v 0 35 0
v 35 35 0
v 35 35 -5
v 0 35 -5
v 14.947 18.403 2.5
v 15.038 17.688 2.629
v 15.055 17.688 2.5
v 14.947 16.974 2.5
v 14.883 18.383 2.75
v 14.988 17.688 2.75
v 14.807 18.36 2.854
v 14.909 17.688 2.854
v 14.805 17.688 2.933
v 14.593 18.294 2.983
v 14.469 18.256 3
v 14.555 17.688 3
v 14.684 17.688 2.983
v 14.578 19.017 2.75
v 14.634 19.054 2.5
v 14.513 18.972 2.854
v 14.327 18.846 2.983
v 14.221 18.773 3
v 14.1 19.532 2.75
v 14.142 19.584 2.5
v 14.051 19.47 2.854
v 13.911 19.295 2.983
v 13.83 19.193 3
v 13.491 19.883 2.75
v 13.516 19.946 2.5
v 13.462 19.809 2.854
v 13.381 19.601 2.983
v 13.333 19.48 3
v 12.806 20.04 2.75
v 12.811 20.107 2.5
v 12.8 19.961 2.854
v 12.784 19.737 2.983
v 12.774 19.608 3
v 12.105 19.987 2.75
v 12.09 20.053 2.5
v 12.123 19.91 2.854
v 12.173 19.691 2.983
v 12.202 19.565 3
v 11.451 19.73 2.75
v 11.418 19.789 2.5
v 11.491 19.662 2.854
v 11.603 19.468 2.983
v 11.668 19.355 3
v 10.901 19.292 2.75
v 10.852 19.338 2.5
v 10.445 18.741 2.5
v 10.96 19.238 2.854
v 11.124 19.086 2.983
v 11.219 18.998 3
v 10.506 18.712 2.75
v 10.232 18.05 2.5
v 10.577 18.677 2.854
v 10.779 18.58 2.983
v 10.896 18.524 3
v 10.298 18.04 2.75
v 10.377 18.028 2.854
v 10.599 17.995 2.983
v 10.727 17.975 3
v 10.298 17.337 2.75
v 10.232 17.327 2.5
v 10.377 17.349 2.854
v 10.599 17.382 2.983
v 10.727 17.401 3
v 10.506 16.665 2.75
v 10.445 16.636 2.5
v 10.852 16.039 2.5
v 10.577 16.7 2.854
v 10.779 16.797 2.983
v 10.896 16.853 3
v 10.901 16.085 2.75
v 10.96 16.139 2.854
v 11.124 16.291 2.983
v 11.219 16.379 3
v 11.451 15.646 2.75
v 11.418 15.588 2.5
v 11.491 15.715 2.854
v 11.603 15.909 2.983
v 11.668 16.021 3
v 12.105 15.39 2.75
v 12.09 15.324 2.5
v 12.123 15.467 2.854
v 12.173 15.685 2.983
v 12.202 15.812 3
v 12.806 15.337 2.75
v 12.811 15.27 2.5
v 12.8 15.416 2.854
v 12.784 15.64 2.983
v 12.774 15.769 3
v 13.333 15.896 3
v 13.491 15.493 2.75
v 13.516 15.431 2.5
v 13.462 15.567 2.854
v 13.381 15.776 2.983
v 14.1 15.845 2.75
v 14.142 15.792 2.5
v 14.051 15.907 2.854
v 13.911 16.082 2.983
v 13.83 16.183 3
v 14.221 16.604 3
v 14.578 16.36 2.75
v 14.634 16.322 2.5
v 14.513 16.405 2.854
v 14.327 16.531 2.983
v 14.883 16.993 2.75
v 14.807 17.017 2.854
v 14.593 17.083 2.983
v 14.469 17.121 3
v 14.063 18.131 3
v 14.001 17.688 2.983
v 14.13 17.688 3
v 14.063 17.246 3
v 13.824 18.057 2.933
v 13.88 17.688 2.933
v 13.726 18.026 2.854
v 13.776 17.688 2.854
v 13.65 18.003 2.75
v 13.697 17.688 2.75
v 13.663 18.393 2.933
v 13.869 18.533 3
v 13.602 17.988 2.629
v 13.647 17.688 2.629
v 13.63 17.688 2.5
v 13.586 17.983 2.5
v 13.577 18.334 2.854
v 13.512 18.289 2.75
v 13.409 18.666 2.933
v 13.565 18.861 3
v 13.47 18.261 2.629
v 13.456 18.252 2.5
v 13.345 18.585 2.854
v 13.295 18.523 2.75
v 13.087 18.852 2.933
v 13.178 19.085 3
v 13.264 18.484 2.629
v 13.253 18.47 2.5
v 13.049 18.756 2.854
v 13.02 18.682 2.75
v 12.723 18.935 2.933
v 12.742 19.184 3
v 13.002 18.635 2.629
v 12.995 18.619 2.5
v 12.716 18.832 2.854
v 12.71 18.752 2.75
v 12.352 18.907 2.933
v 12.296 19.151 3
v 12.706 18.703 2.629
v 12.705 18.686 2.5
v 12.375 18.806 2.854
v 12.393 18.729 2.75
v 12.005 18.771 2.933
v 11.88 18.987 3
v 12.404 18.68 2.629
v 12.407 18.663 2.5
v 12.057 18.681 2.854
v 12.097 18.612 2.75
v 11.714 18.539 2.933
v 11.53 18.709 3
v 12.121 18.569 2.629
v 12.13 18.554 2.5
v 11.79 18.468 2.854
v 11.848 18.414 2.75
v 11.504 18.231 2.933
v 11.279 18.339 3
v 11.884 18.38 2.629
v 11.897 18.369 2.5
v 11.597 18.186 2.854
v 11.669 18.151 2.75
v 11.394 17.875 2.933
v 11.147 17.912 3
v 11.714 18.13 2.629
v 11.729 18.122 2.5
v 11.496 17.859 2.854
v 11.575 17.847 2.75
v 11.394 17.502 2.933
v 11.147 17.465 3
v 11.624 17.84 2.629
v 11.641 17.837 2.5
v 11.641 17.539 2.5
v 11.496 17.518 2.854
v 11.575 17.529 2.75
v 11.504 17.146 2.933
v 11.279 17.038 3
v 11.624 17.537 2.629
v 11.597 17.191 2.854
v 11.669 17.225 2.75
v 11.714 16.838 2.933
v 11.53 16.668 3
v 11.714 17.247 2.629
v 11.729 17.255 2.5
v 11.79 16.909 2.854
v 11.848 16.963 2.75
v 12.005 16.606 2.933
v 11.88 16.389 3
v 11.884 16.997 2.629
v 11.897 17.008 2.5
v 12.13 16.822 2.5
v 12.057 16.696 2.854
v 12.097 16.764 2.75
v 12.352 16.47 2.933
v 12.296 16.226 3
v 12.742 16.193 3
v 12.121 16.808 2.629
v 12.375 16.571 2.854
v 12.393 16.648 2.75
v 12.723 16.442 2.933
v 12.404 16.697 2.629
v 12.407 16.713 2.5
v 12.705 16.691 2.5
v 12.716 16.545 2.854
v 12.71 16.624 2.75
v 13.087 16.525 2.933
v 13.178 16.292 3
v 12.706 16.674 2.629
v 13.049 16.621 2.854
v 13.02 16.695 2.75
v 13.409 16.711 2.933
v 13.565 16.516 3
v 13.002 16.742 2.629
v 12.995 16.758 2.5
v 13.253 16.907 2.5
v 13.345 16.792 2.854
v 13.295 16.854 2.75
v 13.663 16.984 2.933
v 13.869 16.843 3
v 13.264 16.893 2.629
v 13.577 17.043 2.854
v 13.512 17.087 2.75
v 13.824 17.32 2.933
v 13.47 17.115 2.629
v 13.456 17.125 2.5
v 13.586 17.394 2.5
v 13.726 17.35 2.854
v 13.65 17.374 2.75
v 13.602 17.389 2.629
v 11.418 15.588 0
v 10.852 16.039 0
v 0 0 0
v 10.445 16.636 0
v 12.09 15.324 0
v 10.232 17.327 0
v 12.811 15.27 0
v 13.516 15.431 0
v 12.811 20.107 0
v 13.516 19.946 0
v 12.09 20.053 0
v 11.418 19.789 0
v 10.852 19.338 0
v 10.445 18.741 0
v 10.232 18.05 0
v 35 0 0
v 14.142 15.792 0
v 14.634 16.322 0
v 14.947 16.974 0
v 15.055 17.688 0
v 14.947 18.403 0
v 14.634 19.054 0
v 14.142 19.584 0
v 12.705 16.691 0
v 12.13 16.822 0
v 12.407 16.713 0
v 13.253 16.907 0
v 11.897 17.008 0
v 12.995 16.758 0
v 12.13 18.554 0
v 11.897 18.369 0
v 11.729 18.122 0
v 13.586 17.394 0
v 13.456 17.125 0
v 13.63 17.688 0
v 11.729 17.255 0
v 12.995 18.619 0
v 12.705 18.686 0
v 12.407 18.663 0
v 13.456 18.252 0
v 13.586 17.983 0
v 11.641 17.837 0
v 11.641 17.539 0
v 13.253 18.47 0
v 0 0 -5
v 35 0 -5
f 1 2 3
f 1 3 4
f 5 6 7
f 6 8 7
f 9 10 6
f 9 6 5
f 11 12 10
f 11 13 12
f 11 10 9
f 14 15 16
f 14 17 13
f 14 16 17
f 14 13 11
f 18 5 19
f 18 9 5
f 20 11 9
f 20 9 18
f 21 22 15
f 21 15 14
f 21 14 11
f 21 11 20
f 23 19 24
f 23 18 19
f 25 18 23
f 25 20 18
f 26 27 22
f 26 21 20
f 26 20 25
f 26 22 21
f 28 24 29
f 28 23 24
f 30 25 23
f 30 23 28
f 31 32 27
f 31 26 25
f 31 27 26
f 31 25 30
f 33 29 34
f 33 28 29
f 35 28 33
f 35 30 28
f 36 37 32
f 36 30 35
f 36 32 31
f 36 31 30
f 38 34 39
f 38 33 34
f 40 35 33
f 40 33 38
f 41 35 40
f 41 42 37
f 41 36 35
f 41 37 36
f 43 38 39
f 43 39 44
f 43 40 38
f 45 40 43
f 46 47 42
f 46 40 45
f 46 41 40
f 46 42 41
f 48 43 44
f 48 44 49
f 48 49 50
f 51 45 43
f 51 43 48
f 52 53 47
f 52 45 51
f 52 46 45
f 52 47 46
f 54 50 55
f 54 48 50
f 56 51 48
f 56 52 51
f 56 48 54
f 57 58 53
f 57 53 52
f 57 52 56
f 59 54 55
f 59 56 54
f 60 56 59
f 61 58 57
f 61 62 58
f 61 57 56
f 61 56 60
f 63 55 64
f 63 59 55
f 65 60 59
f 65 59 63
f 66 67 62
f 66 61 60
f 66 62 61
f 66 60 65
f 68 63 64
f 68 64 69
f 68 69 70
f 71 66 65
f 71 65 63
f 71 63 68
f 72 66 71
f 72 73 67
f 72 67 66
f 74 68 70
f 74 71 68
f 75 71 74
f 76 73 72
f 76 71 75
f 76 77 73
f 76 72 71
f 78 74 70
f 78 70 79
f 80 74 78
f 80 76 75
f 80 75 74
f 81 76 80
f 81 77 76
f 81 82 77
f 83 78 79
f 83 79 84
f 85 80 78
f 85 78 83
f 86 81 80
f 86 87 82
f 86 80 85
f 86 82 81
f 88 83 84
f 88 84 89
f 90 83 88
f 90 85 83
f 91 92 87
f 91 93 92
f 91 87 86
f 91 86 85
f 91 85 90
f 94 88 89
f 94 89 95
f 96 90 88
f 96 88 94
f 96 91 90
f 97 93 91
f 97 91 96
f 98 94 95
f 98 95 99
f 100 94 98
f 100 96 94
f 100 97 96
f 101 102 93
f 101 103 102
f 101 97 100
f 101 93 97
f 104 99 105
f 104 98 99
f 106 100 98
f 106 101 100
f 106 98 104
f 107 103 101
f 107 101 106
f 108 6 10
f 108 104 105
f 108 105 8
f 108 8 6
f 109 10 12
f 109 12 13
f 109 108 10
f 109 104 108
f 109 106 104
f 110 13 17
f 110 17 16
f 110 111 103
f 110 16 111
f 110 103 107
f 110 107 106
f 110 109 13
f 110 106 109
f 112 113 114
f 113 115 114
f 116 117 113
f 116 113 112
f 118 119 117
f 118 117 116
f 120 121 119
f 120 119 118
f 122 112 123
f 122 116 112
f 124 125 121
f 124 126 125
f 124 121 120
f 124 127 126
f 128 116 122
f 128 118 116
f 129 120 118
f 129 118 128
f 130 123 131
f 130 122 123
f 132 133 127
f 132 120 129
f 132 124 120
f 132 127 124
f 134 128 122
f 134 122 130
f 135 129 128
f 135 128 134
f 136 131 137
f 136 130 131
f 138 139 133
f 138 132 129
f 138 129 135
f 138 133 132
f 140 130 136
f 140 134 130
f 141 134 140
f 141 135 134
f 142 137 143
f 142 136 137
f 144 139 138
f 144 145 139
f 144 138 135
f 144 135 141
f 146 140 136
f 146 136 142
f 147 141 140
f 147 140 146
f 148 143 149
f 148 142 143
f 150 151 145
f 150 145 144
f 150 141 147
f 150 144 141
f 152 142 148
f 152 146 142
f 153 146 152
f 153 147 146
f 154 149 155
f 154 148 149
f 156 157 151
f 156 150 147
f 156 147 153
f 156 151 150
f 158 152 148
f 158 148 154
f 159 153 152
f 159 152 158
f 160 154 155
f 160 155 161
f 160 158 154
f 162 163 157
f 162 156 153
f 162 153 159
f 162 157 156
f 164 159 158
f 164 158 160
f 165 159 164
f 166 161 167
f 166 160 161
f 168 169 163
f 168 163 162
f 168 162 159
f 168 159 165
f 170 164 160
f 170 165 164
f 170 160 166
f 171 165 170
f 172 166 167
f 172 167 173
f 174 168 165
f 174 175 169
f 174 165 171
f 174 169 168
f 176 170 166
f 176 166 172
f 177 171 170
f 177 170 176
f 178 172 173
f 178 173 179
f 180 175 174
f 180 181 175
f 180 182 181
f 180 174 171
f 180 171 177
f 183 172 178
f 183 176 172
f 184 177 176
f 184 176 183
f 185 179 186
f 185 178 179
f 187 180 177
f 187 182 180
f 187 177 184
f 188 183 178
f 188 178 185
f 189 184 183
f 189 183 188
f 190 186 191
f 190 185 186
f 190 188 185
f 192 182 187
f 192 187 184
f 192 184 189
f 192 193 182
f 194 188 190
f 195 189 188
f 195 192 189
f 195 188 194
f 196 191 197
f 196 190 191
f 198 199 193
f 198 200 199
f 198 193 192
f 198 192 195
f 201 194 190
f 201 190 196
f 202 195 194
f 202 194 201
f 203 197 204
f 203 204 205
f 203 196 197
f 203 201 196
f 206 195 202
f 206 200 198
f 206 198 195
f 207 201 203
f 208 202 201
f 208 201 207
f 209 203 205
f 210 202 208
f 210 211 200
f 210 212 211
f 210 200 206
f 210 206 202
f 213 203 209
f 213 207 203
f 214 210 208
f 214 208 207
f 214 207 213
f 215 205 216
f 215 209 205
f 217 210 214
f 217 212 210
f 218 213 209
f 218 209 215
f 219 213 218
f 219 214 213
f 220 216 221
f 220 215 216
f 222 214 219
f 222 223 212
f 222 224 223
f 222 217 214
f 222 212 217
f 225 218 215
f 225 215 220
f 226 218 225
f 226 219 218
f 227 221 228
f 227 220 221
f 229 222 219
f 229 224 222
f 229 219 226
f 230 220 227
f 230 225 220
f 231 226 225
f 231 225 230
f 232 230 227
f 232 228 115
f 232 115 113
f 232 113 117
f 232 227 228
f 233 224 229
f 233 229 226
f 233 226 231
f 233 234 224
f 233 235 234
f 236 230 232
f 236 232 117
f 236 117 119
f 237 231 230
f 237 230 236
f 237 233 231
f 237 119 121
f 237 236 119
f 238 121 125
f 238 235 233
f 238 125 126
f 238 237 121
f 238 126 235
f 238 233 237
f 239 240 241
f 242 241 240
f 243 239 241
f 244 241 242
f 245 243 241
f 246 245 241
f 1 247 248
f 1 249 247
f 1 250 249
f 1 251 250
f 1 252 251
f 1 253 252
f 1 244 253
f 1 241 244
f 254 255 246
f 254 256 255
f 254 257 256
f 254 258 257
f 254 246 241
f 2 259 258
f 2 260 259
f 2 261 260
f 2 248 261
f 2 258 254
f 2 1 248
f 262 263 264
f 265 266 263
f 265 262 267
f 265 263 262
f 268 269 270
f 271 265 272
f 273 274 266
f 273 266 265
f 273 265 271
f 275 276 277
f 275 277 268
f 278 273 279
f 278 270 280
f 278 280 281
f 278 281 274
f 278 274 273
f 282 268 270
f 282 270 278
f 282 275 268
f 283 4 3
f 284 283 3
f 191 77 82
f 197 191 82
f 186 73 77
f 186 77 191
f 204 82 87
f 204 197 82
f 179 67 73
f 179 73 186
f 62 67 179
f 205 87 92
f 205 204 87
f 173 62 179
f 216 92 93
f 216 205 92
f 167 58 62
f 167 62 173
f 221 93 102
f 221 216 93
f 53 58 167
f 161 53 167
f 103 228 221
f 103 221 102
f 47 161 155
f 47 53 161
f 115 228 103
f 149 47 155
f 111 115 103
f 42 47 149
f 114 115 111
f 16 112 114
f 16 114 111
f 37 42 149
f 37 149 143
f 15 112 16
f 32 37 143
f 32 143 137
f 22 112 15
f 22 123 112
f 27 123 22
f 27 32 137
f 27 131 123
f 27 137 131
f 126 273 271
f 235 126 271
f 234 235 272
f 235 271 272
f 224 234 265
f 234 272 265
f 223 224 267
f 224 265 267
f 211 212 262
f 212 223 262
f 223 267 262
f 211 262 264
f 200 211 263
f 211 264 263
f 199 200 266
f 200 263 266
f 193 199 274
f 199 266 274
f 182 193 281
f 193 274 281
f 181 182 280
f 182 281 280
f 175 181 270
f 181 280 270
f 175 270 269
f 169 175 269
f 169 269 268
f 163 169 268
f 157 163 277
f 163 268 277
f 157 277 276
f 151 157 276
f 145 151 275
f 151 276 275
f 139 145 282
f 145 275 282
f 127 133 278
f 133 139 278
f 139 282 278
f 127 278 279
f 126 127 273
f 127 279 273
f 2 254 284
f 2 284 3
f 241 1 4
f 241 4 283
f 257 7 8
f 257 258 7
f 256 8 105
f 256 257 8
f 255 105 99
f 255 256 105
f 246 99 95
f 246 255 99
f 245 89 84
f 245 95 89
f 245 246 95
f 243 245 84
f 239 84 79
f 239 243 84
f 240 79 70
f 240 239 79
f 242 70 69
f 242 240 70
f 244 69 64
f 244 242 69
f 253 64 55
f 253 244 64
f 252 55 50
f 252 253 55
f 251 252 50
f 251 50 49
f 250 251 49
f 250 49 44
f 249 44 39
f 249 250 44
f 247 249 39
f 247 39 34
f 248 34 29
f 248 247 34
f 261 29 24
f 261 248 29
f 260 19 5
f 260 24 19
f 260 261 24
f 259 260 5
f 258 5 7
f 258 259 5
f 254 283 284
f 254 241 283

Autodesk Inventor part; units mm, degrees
ref_plane "YZ Plane" through (0, 0, 0) normal (1, 0, 0) x (0, 1, 0)
ref_plane "XZ Plane" through (0, 0, 0) normal (0, 1, 0) x (-1, 0, 0)
ref_plane "XY Plane" through (0, 0, 0) normal (0, 0, 1) x (1, 0, 0)
sketch "Sketch1" plane through (0, 0, 0) normal (0, 0, 1) x (1, 0, 0)
  line L0 (0, 0) -> (35, 0)
  line L1 (35, 0) -> (35, 35)
  line L2 (35, 35) -> (0, 35)
  line L3 (0, 35) -> (0, 0)
  dimension "d0" = 35
  dimension "d1" = 35
extrude "Extrusion1" add sketch "Sketch1" against normal blind 5
sketch "Sketch2" plane through (0, 0, 0) normal (0, 0, 1) x (1, 0, 0)
  circle A0 centre (12.63, 17.6884) radius 2.425 projected
  circle A1 centre (12.63, 17.6884) radius 1 projected
  point P0 (0, 0)
extrude "Extrusion2" add sketch "Sketch2" along normal blind 3
fillet "Fillet1" radius 0.5 2 edges at (10.205, 17.6884, 3) (11.63, 17.6884, 3)
properties part number "ServoHolderBase"
